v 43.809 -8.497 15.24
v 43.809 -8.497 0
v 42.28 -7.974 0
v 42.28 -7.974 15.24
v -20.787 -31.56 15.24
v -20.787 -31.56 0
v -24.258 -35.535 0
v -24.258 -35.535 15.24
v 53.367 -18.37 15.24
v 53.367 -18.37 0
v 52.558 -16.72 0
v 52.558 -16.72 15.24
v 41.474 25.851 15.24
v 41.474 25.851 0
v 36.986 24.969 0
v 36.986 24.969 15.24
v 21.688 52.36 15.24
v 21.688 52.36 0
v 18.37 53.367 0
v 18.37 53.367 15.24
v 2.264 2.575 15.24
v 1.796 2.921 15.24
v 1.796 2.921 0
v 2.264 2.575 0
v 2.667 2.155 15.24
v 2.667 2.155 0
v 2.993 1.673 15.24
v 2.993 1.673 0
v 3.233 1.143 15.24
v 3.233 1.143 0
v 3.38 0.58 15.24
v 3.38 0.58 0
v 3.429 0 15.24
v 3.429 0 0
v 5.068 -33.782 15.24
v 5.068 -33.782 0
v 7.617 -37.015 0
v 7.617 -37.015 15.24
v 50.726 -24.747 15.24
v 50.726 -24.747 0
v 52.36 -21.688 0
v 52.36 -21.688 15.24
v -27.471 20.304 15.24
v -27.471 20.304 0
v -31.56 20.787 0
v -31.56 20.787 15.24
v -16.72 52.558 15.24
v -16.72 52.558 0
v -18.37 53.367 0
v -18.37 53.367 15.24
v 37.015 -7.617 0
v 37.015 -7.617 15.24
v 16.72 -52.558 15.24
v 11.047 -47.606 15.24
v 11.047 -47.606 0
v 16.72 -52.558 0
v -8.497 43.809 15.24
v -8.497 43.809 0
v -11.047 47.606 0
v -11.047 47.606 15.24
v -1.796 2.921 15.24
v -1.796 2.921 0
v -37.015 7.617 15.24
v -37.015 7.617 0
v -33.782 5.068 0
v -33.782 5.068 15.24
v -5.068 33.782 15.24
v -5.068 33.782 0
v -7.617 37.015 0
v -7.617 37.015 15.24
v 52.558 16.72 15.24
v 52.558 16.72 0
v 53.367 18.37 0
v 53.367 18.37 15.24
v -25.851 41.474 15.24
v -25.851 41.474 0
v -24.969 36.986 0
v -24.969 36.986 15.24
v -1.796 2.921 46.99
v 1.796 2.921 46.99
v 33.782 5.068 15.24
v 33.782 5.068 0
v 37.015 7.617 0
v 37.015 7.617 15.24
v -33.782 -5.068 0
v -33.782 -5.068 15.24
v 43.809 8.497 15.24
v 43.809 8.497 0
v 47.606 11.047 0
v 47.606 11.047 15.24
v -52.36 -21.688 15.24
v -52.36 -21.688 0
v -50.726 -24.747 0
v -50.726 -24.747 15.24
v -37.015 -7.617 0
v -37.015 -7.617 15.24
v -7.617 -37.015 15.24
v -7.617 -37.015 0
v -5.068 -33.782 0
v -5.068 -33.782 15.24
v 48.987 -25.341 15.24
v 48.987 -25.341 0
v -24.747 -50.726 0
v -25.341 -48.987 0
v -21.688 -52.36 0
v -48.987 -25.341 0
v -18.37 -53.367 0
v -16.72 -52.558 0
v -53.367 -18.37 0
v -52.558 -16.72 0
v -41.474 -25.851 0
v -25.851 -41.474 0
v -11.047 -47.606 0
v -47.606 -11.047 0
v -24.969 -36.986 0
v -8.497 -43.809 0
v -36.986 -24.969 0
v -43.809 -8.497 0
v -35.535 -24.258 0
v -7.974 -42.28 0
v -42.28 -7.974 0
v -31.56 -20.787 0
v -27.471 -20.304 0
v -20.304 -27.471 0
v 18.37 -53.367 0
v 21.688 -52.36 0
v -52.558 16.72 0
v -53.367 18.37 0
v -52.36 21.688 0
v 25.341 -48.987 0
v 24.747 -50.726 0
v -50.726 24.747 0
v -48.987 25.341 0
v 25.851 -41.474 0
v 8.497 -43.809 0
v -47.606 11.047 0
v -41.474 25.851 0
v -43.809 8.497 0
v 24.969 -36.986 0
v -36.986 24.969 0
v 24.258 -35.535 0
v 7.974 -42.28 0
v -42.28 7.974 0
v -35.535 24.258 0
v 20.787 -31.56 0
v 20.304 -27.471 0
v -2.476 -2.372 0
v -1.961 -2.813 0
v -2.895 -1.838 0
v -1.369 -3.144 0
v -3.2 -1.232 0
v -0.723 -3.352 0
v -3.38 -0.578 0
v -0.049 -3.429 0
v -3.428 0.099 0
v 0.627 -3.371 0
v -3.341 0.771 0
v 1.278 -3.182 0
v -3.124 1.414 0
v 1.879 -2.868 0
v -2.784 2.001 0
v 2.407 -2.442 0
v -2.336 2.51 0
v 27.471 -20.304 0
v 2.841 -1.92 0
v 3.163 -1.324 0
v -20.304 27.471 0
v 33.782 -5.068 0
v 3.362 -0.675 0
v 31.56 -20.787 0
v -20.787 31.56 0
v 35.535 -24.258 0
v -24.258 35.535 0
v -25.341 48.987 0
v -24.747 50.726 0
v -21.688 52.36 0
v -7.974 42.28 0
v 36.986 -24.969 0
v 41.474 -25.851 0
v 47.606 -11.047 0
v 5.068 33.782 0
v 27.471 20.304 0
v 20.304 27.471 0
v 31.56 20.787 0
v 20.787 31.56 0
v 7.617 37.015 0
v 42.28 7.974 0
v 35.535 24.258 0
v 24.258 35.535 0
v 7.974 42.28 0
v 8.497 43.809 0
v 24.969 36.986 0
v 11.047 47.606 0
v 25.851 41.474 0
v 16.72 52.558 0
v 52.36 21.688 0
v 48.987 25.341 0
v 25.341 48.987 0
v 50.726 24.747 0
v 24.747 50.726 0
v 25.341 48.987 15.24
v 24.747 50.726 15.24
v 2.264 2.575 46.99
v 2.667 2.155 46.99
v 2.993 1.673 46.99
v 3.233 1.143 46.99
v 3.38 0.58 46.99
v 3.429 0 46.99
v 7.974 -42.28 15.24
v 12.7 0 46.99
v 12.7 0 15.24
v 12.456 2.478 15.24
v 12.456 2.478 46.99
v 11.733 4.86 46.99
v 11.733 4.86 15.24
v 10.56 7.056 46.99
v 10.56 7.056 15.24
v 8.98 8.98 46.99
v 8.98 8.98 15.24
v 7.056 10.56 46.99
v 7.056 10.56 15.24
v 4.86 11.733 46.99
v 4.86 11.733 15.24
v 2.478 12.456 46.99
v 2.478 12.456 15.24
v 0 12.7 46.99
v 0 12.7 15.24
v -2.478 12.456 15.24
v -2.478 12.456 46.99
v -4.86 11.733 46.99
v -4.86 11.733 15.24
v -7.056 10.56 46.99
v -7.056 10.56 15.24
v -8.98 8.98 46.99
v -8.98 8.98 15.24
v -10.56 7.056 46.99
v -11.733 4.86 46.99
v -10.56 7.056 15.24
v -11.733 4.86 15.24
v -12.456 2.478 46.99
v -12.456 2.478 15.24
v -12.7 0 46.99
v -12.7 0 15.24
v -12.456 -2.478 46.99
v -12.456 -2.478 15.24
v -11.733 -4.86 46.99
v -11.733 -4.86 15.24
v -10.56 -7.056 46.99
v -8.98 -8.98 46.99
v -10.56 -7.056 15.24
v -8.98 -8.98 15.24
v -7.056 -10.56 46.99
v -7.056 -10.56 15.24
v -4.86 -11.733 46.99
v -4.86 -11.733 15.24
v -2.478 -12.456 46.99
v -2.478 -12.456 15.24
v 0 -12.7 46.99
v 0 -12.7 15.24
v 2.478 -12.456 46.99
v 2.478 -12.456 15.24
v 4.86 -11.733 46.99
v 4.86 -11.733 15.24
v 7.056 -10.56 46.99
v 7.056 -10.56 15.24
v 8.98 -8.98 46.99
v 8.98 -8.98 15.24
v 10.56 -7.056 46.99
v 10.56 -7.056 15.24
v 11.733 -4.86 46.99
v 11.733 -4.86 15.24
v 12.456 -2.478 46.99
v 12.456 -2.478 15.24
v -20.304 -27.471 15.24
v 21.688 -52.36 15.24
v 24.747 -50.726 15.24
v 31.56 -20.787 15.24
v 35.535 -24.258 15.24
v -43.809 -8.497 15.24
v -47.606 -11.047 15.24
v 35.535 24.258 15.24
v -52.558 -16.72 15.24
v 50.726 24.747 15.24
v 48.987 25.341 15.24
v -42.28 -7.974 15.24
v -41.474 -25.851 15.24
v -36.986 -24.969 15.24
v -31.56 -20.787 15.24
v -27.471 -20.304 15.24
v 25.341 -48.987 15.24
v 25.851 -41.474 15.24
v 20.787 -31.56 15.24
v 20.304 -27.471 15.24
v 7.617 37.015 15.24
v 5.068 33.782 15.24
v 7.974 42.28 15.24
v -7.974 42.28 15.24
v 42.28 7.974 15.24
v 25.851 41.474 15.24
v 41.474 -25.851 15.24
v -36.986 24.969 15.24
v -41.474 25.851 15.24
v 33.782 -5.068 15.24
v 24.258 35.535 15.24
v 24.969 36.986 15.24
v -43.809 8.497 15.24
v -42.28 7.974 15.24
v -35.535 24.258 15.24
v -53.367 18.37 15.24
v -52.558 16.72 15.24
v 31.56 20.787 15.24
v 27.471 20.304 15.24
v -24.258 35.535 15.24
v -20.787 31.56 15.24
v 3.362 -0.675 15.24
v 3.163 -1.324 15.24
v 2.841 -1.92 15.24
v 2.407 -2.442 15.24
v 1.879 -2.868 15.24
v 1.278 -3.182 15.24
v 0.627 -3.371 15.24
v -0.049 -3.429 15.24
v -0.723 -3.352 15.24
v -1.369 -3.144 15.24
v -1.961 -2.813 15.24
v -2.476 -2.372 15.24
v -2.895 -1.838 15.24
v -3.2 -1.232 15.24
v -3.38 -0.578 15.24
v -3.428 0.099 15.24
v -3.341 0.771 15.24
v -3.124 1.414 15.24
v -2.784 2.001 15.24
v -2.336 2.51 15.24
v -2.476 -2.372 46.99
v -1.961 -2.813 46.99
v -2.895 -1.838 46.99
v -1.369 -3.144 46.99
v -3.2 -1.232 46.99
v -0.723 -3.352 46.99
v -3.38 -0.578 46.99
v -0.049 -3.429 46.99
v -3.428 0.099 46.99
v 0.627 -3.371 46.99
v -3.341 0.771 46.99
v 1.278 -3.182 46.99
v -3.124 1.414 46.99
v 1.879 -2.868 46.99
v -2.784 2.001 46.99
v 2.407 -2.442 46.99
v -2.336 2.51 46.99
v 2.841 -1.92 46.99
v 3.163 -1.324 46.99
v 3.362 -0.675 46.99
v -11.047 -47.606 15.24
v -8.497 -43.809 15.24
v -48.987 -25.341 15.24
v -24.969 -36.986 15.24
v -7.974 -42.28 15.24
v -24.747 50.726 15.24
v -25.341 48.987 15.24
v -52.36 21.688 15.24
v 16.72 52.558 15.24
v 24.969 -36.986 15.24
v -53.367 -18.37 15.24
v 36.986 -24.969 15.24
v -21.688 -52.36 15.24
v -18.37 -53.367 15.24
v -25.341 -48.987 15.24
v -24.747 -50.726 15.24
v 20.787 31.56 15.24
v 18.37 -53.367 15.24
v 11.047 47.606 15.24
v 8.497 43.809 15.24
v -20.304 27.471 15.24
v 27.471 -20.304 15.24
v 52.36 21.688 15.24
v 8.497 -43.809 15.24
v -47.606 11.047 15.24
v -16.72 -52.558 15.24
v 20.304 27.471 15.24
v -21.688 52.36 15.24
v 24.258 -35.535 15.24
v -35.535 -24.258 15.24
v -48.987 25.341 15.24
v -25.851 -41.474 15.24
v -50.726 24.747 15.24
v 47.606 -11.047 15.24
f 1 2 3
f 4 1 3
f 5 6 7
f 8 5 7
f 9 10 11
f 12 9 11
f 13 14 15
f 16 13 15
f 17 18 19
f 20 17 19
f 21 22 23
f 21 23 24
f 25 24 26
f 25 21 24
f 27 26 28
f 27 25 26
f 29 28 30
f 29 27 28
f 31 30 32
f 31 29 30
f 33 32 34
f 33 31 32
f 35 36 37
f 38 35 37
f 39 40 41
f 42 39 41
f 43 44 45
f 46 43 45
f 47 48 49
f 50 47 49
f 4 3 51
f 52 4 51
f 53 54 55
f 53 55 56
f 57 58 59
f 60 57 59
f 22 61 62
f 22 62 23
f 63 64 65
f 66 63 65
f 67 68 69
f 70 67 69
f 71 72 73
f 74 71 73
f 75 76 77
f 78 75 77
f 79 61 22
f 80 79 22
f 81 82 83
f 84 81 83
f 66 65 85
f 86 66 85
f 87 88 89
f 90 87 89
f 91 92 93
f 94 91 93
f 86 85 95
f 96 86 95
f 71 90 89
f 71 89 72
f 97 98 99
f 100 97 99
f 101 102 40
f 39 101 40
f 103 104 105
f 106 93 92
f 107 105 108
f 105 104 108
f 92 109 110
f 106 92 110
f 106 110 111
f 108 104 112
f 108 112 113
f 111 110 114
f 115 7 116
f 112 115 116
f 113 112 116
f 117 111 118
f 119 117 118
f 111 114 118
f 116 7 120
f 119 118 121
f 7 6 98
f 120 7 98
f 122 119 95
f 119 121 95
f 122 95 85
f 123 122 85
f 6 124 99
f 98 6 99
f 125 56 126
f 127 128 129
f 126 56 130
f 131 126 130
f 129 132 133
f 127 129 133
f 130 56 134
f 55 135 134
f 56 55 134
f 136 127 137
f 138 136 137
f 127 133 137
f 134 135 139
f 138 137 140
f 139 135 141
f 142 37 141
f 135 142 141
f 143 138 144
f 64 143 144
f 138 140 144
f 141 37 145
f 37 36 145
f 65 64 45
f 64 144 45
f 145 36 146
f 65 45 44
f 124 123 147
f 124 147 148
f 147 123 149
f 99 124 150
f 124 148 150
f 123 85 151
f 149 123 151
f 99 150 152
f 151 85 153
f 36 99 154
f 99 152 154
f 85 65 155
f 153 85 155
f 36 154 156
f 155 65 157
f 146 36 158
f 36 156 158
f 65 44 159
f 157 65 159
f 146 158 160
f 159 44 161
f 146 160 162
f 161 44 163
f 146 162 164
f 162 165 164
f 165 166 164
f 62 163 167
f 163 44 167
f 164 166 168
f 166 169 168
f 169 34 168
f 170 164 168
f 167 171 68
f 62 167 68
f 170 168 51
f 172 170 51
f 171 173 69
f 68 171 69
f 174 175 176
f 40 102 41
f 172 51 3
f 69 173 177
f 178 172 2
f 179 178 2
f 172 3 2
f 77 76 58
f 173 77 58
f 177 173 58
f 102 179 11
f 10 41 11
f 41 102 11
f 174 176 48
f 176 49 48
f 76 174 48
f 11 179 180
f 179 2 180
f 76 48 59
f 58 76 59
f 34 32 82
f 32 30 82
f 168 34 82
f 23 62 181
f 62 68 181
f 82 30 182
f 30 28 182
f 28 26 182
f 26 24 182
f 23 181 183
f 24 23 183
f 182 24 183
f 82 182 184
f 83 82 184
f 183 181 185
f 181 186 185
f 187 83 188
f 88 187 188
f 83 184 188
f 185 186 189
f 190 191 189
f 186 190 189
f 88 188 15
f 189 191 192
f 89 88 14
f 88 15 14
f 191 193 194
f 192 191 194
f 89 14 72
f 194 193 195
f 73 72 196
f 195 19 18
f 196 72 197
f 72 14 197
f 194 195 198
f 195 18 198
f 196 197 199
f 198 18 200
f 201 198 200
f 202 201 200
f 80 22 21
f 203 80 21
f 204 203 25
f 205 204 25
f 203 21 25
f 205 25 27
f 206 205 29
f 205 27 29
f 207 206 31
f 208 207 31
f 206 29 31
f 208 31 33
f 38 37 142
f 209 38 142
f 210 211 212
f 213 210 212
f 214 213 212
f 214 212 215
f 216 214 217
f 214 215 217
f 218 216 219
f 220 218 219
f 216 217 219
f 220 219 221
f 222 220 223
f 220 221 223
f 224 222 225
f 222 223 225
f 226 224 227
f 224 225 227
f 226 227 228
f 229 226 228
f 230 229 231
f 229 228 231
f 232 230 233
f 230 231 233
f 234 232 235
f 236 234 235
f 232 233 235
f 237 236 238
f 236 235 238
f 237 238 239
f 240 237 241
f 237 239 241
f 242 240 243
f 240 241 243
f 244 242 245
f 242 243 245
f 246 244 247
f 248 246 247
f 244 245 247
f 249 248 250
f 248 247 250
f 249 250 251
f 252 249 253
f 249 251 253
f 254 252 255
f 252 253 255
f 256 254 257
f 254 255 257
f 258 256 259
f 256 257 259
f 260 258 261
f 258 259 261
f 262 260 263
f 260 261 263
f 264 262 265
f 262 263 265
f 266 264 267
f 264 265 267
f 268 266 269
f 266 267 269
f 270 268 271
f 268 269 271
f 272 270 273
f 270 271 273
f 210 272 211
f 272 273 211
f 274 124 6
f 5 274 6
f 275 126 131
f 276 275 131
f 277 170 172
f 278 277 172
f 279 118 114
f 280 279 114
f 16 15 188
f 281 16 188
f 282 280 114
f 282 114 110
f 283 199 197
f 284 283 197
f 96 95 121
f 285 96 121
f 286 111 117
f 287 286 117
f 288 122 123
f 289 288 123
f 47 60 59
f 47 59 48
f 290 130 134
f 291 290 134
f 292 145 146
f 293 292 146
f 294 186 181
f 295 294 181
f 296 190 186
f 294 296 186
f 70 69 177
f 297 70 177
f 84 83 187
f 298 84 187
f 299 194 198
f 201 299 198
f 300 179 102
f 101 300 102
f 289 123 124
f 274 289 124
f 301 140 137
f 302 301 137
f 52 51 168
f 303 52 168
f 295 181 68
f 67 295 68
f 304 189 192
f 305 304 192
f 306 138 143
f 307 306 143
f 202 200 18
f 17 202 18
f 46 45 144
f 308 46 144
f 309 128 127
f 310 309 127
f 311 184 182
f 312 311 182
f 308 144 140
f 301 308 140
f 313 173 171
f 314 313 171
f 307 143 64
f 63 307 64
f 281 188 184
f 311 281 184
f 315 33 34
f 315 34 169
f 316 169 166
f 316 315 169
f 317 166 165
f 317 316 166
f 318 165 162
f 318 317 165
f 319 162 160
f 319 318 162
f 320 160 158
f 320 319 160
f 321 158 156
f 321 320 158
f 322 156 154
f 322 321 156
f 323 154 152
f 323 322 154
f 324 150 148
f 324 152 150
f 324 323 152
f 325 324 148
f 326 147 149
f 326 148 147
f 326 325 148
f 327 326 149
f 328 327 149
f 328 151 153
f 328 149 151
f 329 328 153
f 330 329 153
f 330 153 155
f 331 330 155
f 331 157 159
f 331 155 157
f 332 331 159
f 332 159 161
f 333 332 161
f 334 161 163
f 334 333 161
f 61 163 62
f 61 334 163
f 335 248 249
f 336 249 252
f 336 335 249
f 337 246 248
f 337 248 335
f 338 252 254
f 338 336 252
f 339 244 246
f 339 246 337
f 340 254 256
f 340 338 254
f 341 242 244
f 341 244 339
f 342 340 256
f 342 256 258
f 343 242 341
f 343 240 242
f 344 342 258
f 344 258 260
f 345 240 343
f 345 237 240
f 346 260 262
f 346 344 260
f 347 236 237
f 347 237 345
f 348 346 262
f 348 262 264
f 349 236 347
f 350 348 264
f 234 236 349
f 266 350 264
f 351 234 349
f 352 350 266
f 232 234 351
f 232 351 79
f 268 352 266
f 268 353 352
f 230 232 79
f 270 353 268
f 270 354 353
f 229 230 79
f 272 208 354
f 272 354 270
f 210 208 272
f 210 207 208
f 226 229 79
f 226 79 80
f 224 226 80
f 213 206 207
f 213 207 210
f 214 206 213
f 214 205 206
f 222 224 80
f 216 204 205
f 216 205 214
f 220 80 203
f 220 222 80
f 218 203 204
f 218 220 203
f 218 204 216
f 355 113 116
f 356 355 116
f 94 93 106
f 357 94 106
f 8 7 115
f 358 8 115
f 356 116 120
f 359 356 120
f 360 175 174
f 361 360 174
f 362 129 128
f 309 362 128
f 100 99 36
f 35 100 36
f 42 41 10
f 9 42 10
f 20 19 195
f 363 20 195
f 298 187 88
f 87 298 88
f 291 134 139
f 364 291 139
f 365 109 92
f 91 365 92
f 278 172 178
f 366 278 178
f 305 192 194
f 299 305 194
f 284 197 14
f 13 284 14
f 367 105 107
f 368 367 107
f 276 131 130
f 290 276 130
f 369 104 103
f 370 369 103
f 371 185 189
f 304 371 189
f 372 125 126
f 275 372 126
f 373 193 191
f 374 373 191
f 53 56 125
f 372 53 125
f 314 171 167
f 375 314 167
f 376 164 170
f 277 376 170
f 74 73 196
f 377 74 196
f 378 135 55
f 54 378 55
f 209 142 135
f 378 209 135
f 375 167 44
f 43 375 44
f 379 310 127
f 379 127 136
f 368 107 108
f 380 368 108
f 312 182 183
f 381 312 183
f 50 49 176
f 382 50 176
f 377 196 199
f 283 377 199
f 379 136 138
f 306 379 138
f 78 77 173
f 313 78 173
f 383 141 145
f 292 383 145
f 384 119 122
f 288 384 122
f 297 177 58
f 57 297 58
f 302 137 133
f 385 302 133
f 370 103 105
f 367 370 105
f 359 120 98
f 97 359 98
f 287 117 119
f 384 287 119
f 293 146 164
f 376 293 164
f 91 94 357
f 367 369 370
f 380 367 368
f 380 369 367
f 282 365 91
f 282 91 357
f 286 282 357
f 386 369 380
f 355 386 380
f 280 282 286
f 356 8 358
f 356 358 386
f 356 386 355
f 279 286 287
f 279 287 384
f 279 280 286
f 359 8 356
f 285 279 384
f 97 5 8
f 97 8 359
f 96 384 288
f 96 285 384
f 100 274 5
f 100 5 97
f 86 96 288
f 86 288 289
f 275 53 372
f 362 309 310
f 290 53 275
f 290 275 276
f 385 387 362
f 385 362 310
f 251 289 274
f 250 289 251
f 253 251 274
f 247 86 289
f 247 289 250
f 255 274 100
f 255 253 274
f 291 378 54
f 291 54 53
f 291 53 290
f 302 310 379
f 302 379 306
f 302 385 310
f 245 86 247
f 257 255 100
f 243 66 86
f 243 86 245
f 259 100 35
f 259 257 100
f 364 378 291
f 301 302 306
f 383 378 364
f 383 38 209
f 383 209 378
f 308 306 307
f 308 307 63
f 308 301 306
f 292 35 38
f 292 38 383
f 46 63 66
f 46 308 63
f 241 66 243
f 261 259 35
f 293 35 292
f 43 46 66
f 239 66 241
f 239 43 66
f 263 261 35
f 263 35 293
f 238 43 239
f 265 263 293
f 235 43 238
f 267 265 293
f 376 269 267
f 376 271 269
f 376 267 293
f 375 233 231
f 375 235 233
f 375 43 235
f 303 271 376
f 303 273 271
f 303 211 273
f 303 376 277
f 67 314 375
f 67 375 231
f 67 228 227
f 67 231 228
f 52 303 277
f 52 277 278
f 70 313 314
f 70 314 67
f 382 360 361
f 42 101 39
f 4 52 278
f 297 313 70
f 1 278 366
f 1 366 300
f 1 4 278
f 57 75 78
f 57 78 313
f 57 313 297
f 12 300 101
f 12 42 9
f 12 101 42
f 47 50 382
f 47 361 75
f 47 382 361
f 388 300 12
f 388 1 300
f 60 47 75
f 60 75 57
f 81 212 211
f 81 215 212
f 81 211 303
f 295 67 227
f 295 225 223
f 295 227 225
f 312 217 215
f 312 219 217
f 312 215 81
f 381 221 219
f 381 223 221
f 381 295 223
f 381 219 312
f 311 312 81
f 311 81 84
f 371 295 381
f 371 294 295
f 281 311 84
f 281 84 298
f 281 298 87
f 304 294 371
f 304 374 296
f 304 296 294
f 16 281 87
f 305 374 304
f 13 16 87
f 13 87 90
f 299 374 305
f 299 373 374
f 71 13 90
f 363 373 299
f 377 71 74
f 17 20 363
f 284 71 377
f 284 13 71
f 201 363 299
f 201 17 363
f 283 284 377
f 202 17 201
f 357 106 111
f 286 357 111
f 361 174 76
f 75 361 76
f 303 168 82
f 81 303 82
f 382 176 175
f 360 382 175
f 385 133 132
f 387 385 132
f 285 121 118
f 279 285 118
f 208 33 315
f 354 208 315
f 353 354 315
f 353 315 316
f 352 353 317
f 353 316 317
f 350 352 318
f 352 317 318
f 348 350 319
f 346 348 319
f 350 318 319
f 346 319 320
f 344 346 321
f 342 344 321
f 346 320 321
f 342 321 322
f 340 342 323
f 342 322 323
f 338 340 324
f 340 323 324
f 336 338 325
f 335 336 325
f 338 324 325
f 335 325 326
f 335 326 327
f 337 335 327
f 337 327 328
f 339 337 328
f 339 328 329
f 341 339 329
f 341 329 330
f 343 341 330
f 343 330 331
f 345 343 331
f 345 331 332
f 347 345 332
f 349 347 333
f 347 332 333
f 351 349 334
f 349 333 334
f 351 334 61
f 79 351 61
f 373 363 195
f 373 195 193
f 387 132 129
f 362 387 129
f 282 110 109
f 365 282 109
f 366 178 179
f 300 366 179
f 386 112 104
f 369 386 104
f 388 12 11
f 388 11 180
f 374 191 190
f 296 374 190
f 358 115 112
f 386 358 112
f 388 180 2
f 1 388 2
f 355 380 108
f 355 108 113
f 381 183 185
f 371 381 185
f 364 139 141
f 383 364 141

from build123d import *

# Parameters (mm, degrees)
F1_DEPTH = 15.24
F2_R     = 12.7
F3_DEPTH = 31.75
F4_DEPTH = 25.4


with BuildPart() as f1:
    # F0 (on Top) → F1 (new body)
    with BuildSketch(Plane.XY):
        Polygon((-48.986719159, 25.3412460777), (-50.7255351294, 24.7465363945), (-52.3601977854, 21.688304154), (-53.366815822, 18.3699267661), (-52.5578082129, 16.719871907), (-47.6057296253, 11.0468524364), (-43.80914346, 8.4974130761), (-42.2801519731, 7.9744654227), (-37.0147232049, 7.6171909331), (-33.782, 5.0679251692), (-33.782, -5.0679251692), (-37.0147232049, -7.6171909331), (-42.2801519731, -7.9744654227), (-43.80914346, -8.4974130761), (-47.6057296253, -11.0468524364), (-52.5578082129, -16.719871907), (-53.366815822, -18.3699267661), (-52.3601977854, -21.688304154), (-50.7255351294, -24.7465363945), (-48.986719159, -25.3412460777), (-41.4736370284, -25.8510271212), (-36.9863201834, -24.9691669416), (-35.5353802528, -24.2577827562), (-31.559527, -20.7871925925), (-27.4710453735, -20.303918365), (-20.303918365, -27.4710453735), (-20.7871925925, -31.559527), (-24.2577827562, -35.5353802528), (-24.9691669416, -36.9863201834), (-25.8510271212, -41.4736370284), (-25.3412460777, -48.986719159), (-24.7465363945, -50.7255351294), (-21.688304154, -52.3601977854), (-18.3699267661, -53.366815822), (-16.719871907, -52.5578082129), (-11.0468524364, -47.6057296253), (-8.4974130761, -43.80914346), (-7.9744654227, -42.2801519731), (-7.6171909331, -37.0147232049), (-5.0679251692, -33.782), (5.0679251692, -33.782), (7.6171909331, -37.0147232049), (7.9744654227, -42.2801519731), (8.4974130761, -43.80914346), (11.0468524364, -47.6057296253), (16.719871907, -52.5578082129), (18.3699267661, -53.366815822), (21.688304154, -52.3601977854), (24.7465363945, -50.7255351294), (25.3412460777, -48.986719159), (25.8510271212, -41.4736370284), (24.9691669416, -36.9863201834), (24.2577827562, -35.5353802528), (20.7871925925, -31.559527), (20.303918365, -27.4710453735), (27.4710453735, -20.303918365), (31.559527, -20.7871925925), (35.5353802528, -24.2577827562), (36.9863201834, -24.9691669416), (41.4736370284, -25.8510271212), (48.986719159, -25.3412460777), (50.7255351294, -24.7465363945), (52.3601977854, -21.688304154), (53.366815822, -18.3699267661), (52.5578082129, -16.719871907), (47.6057296253, -11.0468524364), (43.80914346, -8.4974130761), (42.2801519731, -7.9744654227), (37.0147232049, -7.6171909331), (33.782, -5.0679251692), (33.782, 5.0679251692), (37.0147232049, 7.6171909331), (42.2801519731, 7.9744654227), (43.80914346, 8.4974130761), (47.6057296253, 11.0468524364), (52.5578082129, 16.719871907), (53.366815822, 18.3699267661), (52.3601977854, 21.688304154), (50.7255351294, 24.7465363945), (48.986719159, 25.3412460777), (41.4736370284, 25.8510271212), (36.9863201834, 24.9691669416), (35.5353802528, 24.2577827562), (31.559527, 20.7871925925), (27.4710453735, 20.303918365), (20.303918365, 27.4710453735), (20.7871925925, 31.559527), (24.2577827562, 35.5353802528), (24.9691669416, 36.9863201834), (25.8510271212, 41.4736370284), (25.3412460777, 48.986719159), (24.7465363945, 50.7255351294), (21.688304154, 52.3601977854), (18.3699267661, 53.366815822), (16.719871907, 52.5578082129), (11.0468524364, 47.6057296253), (8.4974130761, 43.80914346), (7.9744654227, 42.2801519731), (7.6171909331, 37.0147232049), (5.0679251692, 33.782), (-5.0679251692, 33.782), (-7.6171909331, 37.0147232049), (-7.9744654227, 42.2801519731), (-8.4974130761, 43.80914346), (-11.0468524364, 47.6057296253), (-16.719871907, 52.5578082129), (-18.3699267661, 53.366815822), (-21.688304154, 52.3601977854), (-24.7465363945, 50.7255351294), (-25.3412460777, 48.986719159), (-25.8510271212, 41.4736370284), (-24.9691669416, 36.9863201834), (-24.2577827562, 35.5353802528), (-20.7871925925, 31.559527), (-20.303918365, 27.4710453735), (-27.4710453735, 20.303918365), (-31.559527, 20.7871925925), (-35.5353802528, 24.2577827562), (-36.9863201834, 24.9691669416), (-41.4736370284, 25.8510271212), align=None)
        Polygon((-6.457554456, 6.1279886028), (-5.0423575535, 7.3366771559), (-3.4067913067, 8.2247200336), (-1.622328418, 8.7533028893), (0.2330374214, 8.8993240645), (2.0782189459, 8.6564005578), (3.8325695574, 8.0351529003), (5.4194220185, 7.0627288788), (6.7694179402, 5.7816284228), (7.8235568446, 4.247847459), (8.5357689507, 2.5284119549), (8.8749315621, 0.6984712932), (8.8262133252, -1.1619911548), (8.3917463583, -2.9716744665), (7.5905194232, -4.6514766054), (6.457554456, -6.1279886028), (5.0423575535, -7.3366771559), (3.4067913067, -8.2247200336), (1.622328418, -8.7533028893), (-0.2330374214, -8.8993240645), (-2.0782189459, -8.6564005578), (-3.8325695574, -8.0351529003), (-5.4194220185, -7.0627288788), (-6.7694179402, -5.7816284228), (-7.8235568446, -4.247847459), (-8.5357689507, -2.5284119549), (-8.8749315621, -0.6984712932), (-8.8262133252, 1.1619911548), (-8.3917463583, 2.9716744665), (-7.5905194232, 4.6514766054), align=None, mode=Mode.SUBTRACT)
        Polygon((-3.4067913067, 8.2247200336), (-5.0423575535, 7.3366771559), (-6.457554456, 6.1279886028), (-7.5905194232, 4.6514766054), (-8.3917463583, 2.9716744665), (-8.8262133252, 1.1619911548), (-8.8749315621, -0.6984712932), (-8.5357689507, -2.5284119549), (-7.8235568446, -4.247847459), (-6.7694179402, -5.7816284228), (-5.4194220185, -7.0627288788), (-3.8325695574, -8.0351529003), (-2.0782189459, -8.6564005578), (-0.2330374214, -8.8993240645), (1.622328418, -8.7533028893), (3.4067913067, -8.2247200336), (5.0423575535, -7.3366771559), (6.457554456, -6.1279886028), (7.5905194232, -4.6514766054), (8.3917463583, -2.9716744665), (8.8262133252, -1.1619911548), (8.8749315621, 0.6984712932), (8.5357689507, 2.5284119549), (7.8235568446, 4.247847459), (6.7694179402, 5.7816284228), (5.4194220185, 7.0627288788), (3.8325695574, 8.0351529003), (2.0782189459, 8.6564005578), (0.2330374214, 8.8993240645), (-1.622328418, 8.7533028893), align=None)
    extrude(amount=F1_DEPTH)

    # F2 (on face) → F3 (join)
    with BuildSketch(Plane.XY.offset(15.24)):
        Circle(F2_R)
        with BuildLine():
            ThreePointArc((1.7960512242, 2.921), (2.9930503377, 1.6732276223), (3.429, 0))
            ThreePointArc((3.429, 0), (-1.6732276223, -2.9930503377), (-1.7960512242, 2.921))
            ThreePointArc((-1.7960512242, 2.921), (0, 3.429), (1.7960512242, 2.921))
        make_face(mode=Mode.SUBTRACT)
        with BuildLine():
            Line((-1.7960512242, 2.921), (1.7960512242, 2.921))
            ThreePointArc((1.7960512242, 2.921), (0, 3.429), (-1.7960512242, 2.921))
        make_face()
    extrude(amount=F3_DEPTH)

    # F4 (cut): a face of the model
    f4_faces = [f1.faces().sort_by_distance(p)[0] for p in [
        (0, -0.108182678, 15.24),
    ]]
    extrude(f4_faces, amount=-F4_DEPTH, mode=Mode.SUBTRACT)


solid = f1.part
